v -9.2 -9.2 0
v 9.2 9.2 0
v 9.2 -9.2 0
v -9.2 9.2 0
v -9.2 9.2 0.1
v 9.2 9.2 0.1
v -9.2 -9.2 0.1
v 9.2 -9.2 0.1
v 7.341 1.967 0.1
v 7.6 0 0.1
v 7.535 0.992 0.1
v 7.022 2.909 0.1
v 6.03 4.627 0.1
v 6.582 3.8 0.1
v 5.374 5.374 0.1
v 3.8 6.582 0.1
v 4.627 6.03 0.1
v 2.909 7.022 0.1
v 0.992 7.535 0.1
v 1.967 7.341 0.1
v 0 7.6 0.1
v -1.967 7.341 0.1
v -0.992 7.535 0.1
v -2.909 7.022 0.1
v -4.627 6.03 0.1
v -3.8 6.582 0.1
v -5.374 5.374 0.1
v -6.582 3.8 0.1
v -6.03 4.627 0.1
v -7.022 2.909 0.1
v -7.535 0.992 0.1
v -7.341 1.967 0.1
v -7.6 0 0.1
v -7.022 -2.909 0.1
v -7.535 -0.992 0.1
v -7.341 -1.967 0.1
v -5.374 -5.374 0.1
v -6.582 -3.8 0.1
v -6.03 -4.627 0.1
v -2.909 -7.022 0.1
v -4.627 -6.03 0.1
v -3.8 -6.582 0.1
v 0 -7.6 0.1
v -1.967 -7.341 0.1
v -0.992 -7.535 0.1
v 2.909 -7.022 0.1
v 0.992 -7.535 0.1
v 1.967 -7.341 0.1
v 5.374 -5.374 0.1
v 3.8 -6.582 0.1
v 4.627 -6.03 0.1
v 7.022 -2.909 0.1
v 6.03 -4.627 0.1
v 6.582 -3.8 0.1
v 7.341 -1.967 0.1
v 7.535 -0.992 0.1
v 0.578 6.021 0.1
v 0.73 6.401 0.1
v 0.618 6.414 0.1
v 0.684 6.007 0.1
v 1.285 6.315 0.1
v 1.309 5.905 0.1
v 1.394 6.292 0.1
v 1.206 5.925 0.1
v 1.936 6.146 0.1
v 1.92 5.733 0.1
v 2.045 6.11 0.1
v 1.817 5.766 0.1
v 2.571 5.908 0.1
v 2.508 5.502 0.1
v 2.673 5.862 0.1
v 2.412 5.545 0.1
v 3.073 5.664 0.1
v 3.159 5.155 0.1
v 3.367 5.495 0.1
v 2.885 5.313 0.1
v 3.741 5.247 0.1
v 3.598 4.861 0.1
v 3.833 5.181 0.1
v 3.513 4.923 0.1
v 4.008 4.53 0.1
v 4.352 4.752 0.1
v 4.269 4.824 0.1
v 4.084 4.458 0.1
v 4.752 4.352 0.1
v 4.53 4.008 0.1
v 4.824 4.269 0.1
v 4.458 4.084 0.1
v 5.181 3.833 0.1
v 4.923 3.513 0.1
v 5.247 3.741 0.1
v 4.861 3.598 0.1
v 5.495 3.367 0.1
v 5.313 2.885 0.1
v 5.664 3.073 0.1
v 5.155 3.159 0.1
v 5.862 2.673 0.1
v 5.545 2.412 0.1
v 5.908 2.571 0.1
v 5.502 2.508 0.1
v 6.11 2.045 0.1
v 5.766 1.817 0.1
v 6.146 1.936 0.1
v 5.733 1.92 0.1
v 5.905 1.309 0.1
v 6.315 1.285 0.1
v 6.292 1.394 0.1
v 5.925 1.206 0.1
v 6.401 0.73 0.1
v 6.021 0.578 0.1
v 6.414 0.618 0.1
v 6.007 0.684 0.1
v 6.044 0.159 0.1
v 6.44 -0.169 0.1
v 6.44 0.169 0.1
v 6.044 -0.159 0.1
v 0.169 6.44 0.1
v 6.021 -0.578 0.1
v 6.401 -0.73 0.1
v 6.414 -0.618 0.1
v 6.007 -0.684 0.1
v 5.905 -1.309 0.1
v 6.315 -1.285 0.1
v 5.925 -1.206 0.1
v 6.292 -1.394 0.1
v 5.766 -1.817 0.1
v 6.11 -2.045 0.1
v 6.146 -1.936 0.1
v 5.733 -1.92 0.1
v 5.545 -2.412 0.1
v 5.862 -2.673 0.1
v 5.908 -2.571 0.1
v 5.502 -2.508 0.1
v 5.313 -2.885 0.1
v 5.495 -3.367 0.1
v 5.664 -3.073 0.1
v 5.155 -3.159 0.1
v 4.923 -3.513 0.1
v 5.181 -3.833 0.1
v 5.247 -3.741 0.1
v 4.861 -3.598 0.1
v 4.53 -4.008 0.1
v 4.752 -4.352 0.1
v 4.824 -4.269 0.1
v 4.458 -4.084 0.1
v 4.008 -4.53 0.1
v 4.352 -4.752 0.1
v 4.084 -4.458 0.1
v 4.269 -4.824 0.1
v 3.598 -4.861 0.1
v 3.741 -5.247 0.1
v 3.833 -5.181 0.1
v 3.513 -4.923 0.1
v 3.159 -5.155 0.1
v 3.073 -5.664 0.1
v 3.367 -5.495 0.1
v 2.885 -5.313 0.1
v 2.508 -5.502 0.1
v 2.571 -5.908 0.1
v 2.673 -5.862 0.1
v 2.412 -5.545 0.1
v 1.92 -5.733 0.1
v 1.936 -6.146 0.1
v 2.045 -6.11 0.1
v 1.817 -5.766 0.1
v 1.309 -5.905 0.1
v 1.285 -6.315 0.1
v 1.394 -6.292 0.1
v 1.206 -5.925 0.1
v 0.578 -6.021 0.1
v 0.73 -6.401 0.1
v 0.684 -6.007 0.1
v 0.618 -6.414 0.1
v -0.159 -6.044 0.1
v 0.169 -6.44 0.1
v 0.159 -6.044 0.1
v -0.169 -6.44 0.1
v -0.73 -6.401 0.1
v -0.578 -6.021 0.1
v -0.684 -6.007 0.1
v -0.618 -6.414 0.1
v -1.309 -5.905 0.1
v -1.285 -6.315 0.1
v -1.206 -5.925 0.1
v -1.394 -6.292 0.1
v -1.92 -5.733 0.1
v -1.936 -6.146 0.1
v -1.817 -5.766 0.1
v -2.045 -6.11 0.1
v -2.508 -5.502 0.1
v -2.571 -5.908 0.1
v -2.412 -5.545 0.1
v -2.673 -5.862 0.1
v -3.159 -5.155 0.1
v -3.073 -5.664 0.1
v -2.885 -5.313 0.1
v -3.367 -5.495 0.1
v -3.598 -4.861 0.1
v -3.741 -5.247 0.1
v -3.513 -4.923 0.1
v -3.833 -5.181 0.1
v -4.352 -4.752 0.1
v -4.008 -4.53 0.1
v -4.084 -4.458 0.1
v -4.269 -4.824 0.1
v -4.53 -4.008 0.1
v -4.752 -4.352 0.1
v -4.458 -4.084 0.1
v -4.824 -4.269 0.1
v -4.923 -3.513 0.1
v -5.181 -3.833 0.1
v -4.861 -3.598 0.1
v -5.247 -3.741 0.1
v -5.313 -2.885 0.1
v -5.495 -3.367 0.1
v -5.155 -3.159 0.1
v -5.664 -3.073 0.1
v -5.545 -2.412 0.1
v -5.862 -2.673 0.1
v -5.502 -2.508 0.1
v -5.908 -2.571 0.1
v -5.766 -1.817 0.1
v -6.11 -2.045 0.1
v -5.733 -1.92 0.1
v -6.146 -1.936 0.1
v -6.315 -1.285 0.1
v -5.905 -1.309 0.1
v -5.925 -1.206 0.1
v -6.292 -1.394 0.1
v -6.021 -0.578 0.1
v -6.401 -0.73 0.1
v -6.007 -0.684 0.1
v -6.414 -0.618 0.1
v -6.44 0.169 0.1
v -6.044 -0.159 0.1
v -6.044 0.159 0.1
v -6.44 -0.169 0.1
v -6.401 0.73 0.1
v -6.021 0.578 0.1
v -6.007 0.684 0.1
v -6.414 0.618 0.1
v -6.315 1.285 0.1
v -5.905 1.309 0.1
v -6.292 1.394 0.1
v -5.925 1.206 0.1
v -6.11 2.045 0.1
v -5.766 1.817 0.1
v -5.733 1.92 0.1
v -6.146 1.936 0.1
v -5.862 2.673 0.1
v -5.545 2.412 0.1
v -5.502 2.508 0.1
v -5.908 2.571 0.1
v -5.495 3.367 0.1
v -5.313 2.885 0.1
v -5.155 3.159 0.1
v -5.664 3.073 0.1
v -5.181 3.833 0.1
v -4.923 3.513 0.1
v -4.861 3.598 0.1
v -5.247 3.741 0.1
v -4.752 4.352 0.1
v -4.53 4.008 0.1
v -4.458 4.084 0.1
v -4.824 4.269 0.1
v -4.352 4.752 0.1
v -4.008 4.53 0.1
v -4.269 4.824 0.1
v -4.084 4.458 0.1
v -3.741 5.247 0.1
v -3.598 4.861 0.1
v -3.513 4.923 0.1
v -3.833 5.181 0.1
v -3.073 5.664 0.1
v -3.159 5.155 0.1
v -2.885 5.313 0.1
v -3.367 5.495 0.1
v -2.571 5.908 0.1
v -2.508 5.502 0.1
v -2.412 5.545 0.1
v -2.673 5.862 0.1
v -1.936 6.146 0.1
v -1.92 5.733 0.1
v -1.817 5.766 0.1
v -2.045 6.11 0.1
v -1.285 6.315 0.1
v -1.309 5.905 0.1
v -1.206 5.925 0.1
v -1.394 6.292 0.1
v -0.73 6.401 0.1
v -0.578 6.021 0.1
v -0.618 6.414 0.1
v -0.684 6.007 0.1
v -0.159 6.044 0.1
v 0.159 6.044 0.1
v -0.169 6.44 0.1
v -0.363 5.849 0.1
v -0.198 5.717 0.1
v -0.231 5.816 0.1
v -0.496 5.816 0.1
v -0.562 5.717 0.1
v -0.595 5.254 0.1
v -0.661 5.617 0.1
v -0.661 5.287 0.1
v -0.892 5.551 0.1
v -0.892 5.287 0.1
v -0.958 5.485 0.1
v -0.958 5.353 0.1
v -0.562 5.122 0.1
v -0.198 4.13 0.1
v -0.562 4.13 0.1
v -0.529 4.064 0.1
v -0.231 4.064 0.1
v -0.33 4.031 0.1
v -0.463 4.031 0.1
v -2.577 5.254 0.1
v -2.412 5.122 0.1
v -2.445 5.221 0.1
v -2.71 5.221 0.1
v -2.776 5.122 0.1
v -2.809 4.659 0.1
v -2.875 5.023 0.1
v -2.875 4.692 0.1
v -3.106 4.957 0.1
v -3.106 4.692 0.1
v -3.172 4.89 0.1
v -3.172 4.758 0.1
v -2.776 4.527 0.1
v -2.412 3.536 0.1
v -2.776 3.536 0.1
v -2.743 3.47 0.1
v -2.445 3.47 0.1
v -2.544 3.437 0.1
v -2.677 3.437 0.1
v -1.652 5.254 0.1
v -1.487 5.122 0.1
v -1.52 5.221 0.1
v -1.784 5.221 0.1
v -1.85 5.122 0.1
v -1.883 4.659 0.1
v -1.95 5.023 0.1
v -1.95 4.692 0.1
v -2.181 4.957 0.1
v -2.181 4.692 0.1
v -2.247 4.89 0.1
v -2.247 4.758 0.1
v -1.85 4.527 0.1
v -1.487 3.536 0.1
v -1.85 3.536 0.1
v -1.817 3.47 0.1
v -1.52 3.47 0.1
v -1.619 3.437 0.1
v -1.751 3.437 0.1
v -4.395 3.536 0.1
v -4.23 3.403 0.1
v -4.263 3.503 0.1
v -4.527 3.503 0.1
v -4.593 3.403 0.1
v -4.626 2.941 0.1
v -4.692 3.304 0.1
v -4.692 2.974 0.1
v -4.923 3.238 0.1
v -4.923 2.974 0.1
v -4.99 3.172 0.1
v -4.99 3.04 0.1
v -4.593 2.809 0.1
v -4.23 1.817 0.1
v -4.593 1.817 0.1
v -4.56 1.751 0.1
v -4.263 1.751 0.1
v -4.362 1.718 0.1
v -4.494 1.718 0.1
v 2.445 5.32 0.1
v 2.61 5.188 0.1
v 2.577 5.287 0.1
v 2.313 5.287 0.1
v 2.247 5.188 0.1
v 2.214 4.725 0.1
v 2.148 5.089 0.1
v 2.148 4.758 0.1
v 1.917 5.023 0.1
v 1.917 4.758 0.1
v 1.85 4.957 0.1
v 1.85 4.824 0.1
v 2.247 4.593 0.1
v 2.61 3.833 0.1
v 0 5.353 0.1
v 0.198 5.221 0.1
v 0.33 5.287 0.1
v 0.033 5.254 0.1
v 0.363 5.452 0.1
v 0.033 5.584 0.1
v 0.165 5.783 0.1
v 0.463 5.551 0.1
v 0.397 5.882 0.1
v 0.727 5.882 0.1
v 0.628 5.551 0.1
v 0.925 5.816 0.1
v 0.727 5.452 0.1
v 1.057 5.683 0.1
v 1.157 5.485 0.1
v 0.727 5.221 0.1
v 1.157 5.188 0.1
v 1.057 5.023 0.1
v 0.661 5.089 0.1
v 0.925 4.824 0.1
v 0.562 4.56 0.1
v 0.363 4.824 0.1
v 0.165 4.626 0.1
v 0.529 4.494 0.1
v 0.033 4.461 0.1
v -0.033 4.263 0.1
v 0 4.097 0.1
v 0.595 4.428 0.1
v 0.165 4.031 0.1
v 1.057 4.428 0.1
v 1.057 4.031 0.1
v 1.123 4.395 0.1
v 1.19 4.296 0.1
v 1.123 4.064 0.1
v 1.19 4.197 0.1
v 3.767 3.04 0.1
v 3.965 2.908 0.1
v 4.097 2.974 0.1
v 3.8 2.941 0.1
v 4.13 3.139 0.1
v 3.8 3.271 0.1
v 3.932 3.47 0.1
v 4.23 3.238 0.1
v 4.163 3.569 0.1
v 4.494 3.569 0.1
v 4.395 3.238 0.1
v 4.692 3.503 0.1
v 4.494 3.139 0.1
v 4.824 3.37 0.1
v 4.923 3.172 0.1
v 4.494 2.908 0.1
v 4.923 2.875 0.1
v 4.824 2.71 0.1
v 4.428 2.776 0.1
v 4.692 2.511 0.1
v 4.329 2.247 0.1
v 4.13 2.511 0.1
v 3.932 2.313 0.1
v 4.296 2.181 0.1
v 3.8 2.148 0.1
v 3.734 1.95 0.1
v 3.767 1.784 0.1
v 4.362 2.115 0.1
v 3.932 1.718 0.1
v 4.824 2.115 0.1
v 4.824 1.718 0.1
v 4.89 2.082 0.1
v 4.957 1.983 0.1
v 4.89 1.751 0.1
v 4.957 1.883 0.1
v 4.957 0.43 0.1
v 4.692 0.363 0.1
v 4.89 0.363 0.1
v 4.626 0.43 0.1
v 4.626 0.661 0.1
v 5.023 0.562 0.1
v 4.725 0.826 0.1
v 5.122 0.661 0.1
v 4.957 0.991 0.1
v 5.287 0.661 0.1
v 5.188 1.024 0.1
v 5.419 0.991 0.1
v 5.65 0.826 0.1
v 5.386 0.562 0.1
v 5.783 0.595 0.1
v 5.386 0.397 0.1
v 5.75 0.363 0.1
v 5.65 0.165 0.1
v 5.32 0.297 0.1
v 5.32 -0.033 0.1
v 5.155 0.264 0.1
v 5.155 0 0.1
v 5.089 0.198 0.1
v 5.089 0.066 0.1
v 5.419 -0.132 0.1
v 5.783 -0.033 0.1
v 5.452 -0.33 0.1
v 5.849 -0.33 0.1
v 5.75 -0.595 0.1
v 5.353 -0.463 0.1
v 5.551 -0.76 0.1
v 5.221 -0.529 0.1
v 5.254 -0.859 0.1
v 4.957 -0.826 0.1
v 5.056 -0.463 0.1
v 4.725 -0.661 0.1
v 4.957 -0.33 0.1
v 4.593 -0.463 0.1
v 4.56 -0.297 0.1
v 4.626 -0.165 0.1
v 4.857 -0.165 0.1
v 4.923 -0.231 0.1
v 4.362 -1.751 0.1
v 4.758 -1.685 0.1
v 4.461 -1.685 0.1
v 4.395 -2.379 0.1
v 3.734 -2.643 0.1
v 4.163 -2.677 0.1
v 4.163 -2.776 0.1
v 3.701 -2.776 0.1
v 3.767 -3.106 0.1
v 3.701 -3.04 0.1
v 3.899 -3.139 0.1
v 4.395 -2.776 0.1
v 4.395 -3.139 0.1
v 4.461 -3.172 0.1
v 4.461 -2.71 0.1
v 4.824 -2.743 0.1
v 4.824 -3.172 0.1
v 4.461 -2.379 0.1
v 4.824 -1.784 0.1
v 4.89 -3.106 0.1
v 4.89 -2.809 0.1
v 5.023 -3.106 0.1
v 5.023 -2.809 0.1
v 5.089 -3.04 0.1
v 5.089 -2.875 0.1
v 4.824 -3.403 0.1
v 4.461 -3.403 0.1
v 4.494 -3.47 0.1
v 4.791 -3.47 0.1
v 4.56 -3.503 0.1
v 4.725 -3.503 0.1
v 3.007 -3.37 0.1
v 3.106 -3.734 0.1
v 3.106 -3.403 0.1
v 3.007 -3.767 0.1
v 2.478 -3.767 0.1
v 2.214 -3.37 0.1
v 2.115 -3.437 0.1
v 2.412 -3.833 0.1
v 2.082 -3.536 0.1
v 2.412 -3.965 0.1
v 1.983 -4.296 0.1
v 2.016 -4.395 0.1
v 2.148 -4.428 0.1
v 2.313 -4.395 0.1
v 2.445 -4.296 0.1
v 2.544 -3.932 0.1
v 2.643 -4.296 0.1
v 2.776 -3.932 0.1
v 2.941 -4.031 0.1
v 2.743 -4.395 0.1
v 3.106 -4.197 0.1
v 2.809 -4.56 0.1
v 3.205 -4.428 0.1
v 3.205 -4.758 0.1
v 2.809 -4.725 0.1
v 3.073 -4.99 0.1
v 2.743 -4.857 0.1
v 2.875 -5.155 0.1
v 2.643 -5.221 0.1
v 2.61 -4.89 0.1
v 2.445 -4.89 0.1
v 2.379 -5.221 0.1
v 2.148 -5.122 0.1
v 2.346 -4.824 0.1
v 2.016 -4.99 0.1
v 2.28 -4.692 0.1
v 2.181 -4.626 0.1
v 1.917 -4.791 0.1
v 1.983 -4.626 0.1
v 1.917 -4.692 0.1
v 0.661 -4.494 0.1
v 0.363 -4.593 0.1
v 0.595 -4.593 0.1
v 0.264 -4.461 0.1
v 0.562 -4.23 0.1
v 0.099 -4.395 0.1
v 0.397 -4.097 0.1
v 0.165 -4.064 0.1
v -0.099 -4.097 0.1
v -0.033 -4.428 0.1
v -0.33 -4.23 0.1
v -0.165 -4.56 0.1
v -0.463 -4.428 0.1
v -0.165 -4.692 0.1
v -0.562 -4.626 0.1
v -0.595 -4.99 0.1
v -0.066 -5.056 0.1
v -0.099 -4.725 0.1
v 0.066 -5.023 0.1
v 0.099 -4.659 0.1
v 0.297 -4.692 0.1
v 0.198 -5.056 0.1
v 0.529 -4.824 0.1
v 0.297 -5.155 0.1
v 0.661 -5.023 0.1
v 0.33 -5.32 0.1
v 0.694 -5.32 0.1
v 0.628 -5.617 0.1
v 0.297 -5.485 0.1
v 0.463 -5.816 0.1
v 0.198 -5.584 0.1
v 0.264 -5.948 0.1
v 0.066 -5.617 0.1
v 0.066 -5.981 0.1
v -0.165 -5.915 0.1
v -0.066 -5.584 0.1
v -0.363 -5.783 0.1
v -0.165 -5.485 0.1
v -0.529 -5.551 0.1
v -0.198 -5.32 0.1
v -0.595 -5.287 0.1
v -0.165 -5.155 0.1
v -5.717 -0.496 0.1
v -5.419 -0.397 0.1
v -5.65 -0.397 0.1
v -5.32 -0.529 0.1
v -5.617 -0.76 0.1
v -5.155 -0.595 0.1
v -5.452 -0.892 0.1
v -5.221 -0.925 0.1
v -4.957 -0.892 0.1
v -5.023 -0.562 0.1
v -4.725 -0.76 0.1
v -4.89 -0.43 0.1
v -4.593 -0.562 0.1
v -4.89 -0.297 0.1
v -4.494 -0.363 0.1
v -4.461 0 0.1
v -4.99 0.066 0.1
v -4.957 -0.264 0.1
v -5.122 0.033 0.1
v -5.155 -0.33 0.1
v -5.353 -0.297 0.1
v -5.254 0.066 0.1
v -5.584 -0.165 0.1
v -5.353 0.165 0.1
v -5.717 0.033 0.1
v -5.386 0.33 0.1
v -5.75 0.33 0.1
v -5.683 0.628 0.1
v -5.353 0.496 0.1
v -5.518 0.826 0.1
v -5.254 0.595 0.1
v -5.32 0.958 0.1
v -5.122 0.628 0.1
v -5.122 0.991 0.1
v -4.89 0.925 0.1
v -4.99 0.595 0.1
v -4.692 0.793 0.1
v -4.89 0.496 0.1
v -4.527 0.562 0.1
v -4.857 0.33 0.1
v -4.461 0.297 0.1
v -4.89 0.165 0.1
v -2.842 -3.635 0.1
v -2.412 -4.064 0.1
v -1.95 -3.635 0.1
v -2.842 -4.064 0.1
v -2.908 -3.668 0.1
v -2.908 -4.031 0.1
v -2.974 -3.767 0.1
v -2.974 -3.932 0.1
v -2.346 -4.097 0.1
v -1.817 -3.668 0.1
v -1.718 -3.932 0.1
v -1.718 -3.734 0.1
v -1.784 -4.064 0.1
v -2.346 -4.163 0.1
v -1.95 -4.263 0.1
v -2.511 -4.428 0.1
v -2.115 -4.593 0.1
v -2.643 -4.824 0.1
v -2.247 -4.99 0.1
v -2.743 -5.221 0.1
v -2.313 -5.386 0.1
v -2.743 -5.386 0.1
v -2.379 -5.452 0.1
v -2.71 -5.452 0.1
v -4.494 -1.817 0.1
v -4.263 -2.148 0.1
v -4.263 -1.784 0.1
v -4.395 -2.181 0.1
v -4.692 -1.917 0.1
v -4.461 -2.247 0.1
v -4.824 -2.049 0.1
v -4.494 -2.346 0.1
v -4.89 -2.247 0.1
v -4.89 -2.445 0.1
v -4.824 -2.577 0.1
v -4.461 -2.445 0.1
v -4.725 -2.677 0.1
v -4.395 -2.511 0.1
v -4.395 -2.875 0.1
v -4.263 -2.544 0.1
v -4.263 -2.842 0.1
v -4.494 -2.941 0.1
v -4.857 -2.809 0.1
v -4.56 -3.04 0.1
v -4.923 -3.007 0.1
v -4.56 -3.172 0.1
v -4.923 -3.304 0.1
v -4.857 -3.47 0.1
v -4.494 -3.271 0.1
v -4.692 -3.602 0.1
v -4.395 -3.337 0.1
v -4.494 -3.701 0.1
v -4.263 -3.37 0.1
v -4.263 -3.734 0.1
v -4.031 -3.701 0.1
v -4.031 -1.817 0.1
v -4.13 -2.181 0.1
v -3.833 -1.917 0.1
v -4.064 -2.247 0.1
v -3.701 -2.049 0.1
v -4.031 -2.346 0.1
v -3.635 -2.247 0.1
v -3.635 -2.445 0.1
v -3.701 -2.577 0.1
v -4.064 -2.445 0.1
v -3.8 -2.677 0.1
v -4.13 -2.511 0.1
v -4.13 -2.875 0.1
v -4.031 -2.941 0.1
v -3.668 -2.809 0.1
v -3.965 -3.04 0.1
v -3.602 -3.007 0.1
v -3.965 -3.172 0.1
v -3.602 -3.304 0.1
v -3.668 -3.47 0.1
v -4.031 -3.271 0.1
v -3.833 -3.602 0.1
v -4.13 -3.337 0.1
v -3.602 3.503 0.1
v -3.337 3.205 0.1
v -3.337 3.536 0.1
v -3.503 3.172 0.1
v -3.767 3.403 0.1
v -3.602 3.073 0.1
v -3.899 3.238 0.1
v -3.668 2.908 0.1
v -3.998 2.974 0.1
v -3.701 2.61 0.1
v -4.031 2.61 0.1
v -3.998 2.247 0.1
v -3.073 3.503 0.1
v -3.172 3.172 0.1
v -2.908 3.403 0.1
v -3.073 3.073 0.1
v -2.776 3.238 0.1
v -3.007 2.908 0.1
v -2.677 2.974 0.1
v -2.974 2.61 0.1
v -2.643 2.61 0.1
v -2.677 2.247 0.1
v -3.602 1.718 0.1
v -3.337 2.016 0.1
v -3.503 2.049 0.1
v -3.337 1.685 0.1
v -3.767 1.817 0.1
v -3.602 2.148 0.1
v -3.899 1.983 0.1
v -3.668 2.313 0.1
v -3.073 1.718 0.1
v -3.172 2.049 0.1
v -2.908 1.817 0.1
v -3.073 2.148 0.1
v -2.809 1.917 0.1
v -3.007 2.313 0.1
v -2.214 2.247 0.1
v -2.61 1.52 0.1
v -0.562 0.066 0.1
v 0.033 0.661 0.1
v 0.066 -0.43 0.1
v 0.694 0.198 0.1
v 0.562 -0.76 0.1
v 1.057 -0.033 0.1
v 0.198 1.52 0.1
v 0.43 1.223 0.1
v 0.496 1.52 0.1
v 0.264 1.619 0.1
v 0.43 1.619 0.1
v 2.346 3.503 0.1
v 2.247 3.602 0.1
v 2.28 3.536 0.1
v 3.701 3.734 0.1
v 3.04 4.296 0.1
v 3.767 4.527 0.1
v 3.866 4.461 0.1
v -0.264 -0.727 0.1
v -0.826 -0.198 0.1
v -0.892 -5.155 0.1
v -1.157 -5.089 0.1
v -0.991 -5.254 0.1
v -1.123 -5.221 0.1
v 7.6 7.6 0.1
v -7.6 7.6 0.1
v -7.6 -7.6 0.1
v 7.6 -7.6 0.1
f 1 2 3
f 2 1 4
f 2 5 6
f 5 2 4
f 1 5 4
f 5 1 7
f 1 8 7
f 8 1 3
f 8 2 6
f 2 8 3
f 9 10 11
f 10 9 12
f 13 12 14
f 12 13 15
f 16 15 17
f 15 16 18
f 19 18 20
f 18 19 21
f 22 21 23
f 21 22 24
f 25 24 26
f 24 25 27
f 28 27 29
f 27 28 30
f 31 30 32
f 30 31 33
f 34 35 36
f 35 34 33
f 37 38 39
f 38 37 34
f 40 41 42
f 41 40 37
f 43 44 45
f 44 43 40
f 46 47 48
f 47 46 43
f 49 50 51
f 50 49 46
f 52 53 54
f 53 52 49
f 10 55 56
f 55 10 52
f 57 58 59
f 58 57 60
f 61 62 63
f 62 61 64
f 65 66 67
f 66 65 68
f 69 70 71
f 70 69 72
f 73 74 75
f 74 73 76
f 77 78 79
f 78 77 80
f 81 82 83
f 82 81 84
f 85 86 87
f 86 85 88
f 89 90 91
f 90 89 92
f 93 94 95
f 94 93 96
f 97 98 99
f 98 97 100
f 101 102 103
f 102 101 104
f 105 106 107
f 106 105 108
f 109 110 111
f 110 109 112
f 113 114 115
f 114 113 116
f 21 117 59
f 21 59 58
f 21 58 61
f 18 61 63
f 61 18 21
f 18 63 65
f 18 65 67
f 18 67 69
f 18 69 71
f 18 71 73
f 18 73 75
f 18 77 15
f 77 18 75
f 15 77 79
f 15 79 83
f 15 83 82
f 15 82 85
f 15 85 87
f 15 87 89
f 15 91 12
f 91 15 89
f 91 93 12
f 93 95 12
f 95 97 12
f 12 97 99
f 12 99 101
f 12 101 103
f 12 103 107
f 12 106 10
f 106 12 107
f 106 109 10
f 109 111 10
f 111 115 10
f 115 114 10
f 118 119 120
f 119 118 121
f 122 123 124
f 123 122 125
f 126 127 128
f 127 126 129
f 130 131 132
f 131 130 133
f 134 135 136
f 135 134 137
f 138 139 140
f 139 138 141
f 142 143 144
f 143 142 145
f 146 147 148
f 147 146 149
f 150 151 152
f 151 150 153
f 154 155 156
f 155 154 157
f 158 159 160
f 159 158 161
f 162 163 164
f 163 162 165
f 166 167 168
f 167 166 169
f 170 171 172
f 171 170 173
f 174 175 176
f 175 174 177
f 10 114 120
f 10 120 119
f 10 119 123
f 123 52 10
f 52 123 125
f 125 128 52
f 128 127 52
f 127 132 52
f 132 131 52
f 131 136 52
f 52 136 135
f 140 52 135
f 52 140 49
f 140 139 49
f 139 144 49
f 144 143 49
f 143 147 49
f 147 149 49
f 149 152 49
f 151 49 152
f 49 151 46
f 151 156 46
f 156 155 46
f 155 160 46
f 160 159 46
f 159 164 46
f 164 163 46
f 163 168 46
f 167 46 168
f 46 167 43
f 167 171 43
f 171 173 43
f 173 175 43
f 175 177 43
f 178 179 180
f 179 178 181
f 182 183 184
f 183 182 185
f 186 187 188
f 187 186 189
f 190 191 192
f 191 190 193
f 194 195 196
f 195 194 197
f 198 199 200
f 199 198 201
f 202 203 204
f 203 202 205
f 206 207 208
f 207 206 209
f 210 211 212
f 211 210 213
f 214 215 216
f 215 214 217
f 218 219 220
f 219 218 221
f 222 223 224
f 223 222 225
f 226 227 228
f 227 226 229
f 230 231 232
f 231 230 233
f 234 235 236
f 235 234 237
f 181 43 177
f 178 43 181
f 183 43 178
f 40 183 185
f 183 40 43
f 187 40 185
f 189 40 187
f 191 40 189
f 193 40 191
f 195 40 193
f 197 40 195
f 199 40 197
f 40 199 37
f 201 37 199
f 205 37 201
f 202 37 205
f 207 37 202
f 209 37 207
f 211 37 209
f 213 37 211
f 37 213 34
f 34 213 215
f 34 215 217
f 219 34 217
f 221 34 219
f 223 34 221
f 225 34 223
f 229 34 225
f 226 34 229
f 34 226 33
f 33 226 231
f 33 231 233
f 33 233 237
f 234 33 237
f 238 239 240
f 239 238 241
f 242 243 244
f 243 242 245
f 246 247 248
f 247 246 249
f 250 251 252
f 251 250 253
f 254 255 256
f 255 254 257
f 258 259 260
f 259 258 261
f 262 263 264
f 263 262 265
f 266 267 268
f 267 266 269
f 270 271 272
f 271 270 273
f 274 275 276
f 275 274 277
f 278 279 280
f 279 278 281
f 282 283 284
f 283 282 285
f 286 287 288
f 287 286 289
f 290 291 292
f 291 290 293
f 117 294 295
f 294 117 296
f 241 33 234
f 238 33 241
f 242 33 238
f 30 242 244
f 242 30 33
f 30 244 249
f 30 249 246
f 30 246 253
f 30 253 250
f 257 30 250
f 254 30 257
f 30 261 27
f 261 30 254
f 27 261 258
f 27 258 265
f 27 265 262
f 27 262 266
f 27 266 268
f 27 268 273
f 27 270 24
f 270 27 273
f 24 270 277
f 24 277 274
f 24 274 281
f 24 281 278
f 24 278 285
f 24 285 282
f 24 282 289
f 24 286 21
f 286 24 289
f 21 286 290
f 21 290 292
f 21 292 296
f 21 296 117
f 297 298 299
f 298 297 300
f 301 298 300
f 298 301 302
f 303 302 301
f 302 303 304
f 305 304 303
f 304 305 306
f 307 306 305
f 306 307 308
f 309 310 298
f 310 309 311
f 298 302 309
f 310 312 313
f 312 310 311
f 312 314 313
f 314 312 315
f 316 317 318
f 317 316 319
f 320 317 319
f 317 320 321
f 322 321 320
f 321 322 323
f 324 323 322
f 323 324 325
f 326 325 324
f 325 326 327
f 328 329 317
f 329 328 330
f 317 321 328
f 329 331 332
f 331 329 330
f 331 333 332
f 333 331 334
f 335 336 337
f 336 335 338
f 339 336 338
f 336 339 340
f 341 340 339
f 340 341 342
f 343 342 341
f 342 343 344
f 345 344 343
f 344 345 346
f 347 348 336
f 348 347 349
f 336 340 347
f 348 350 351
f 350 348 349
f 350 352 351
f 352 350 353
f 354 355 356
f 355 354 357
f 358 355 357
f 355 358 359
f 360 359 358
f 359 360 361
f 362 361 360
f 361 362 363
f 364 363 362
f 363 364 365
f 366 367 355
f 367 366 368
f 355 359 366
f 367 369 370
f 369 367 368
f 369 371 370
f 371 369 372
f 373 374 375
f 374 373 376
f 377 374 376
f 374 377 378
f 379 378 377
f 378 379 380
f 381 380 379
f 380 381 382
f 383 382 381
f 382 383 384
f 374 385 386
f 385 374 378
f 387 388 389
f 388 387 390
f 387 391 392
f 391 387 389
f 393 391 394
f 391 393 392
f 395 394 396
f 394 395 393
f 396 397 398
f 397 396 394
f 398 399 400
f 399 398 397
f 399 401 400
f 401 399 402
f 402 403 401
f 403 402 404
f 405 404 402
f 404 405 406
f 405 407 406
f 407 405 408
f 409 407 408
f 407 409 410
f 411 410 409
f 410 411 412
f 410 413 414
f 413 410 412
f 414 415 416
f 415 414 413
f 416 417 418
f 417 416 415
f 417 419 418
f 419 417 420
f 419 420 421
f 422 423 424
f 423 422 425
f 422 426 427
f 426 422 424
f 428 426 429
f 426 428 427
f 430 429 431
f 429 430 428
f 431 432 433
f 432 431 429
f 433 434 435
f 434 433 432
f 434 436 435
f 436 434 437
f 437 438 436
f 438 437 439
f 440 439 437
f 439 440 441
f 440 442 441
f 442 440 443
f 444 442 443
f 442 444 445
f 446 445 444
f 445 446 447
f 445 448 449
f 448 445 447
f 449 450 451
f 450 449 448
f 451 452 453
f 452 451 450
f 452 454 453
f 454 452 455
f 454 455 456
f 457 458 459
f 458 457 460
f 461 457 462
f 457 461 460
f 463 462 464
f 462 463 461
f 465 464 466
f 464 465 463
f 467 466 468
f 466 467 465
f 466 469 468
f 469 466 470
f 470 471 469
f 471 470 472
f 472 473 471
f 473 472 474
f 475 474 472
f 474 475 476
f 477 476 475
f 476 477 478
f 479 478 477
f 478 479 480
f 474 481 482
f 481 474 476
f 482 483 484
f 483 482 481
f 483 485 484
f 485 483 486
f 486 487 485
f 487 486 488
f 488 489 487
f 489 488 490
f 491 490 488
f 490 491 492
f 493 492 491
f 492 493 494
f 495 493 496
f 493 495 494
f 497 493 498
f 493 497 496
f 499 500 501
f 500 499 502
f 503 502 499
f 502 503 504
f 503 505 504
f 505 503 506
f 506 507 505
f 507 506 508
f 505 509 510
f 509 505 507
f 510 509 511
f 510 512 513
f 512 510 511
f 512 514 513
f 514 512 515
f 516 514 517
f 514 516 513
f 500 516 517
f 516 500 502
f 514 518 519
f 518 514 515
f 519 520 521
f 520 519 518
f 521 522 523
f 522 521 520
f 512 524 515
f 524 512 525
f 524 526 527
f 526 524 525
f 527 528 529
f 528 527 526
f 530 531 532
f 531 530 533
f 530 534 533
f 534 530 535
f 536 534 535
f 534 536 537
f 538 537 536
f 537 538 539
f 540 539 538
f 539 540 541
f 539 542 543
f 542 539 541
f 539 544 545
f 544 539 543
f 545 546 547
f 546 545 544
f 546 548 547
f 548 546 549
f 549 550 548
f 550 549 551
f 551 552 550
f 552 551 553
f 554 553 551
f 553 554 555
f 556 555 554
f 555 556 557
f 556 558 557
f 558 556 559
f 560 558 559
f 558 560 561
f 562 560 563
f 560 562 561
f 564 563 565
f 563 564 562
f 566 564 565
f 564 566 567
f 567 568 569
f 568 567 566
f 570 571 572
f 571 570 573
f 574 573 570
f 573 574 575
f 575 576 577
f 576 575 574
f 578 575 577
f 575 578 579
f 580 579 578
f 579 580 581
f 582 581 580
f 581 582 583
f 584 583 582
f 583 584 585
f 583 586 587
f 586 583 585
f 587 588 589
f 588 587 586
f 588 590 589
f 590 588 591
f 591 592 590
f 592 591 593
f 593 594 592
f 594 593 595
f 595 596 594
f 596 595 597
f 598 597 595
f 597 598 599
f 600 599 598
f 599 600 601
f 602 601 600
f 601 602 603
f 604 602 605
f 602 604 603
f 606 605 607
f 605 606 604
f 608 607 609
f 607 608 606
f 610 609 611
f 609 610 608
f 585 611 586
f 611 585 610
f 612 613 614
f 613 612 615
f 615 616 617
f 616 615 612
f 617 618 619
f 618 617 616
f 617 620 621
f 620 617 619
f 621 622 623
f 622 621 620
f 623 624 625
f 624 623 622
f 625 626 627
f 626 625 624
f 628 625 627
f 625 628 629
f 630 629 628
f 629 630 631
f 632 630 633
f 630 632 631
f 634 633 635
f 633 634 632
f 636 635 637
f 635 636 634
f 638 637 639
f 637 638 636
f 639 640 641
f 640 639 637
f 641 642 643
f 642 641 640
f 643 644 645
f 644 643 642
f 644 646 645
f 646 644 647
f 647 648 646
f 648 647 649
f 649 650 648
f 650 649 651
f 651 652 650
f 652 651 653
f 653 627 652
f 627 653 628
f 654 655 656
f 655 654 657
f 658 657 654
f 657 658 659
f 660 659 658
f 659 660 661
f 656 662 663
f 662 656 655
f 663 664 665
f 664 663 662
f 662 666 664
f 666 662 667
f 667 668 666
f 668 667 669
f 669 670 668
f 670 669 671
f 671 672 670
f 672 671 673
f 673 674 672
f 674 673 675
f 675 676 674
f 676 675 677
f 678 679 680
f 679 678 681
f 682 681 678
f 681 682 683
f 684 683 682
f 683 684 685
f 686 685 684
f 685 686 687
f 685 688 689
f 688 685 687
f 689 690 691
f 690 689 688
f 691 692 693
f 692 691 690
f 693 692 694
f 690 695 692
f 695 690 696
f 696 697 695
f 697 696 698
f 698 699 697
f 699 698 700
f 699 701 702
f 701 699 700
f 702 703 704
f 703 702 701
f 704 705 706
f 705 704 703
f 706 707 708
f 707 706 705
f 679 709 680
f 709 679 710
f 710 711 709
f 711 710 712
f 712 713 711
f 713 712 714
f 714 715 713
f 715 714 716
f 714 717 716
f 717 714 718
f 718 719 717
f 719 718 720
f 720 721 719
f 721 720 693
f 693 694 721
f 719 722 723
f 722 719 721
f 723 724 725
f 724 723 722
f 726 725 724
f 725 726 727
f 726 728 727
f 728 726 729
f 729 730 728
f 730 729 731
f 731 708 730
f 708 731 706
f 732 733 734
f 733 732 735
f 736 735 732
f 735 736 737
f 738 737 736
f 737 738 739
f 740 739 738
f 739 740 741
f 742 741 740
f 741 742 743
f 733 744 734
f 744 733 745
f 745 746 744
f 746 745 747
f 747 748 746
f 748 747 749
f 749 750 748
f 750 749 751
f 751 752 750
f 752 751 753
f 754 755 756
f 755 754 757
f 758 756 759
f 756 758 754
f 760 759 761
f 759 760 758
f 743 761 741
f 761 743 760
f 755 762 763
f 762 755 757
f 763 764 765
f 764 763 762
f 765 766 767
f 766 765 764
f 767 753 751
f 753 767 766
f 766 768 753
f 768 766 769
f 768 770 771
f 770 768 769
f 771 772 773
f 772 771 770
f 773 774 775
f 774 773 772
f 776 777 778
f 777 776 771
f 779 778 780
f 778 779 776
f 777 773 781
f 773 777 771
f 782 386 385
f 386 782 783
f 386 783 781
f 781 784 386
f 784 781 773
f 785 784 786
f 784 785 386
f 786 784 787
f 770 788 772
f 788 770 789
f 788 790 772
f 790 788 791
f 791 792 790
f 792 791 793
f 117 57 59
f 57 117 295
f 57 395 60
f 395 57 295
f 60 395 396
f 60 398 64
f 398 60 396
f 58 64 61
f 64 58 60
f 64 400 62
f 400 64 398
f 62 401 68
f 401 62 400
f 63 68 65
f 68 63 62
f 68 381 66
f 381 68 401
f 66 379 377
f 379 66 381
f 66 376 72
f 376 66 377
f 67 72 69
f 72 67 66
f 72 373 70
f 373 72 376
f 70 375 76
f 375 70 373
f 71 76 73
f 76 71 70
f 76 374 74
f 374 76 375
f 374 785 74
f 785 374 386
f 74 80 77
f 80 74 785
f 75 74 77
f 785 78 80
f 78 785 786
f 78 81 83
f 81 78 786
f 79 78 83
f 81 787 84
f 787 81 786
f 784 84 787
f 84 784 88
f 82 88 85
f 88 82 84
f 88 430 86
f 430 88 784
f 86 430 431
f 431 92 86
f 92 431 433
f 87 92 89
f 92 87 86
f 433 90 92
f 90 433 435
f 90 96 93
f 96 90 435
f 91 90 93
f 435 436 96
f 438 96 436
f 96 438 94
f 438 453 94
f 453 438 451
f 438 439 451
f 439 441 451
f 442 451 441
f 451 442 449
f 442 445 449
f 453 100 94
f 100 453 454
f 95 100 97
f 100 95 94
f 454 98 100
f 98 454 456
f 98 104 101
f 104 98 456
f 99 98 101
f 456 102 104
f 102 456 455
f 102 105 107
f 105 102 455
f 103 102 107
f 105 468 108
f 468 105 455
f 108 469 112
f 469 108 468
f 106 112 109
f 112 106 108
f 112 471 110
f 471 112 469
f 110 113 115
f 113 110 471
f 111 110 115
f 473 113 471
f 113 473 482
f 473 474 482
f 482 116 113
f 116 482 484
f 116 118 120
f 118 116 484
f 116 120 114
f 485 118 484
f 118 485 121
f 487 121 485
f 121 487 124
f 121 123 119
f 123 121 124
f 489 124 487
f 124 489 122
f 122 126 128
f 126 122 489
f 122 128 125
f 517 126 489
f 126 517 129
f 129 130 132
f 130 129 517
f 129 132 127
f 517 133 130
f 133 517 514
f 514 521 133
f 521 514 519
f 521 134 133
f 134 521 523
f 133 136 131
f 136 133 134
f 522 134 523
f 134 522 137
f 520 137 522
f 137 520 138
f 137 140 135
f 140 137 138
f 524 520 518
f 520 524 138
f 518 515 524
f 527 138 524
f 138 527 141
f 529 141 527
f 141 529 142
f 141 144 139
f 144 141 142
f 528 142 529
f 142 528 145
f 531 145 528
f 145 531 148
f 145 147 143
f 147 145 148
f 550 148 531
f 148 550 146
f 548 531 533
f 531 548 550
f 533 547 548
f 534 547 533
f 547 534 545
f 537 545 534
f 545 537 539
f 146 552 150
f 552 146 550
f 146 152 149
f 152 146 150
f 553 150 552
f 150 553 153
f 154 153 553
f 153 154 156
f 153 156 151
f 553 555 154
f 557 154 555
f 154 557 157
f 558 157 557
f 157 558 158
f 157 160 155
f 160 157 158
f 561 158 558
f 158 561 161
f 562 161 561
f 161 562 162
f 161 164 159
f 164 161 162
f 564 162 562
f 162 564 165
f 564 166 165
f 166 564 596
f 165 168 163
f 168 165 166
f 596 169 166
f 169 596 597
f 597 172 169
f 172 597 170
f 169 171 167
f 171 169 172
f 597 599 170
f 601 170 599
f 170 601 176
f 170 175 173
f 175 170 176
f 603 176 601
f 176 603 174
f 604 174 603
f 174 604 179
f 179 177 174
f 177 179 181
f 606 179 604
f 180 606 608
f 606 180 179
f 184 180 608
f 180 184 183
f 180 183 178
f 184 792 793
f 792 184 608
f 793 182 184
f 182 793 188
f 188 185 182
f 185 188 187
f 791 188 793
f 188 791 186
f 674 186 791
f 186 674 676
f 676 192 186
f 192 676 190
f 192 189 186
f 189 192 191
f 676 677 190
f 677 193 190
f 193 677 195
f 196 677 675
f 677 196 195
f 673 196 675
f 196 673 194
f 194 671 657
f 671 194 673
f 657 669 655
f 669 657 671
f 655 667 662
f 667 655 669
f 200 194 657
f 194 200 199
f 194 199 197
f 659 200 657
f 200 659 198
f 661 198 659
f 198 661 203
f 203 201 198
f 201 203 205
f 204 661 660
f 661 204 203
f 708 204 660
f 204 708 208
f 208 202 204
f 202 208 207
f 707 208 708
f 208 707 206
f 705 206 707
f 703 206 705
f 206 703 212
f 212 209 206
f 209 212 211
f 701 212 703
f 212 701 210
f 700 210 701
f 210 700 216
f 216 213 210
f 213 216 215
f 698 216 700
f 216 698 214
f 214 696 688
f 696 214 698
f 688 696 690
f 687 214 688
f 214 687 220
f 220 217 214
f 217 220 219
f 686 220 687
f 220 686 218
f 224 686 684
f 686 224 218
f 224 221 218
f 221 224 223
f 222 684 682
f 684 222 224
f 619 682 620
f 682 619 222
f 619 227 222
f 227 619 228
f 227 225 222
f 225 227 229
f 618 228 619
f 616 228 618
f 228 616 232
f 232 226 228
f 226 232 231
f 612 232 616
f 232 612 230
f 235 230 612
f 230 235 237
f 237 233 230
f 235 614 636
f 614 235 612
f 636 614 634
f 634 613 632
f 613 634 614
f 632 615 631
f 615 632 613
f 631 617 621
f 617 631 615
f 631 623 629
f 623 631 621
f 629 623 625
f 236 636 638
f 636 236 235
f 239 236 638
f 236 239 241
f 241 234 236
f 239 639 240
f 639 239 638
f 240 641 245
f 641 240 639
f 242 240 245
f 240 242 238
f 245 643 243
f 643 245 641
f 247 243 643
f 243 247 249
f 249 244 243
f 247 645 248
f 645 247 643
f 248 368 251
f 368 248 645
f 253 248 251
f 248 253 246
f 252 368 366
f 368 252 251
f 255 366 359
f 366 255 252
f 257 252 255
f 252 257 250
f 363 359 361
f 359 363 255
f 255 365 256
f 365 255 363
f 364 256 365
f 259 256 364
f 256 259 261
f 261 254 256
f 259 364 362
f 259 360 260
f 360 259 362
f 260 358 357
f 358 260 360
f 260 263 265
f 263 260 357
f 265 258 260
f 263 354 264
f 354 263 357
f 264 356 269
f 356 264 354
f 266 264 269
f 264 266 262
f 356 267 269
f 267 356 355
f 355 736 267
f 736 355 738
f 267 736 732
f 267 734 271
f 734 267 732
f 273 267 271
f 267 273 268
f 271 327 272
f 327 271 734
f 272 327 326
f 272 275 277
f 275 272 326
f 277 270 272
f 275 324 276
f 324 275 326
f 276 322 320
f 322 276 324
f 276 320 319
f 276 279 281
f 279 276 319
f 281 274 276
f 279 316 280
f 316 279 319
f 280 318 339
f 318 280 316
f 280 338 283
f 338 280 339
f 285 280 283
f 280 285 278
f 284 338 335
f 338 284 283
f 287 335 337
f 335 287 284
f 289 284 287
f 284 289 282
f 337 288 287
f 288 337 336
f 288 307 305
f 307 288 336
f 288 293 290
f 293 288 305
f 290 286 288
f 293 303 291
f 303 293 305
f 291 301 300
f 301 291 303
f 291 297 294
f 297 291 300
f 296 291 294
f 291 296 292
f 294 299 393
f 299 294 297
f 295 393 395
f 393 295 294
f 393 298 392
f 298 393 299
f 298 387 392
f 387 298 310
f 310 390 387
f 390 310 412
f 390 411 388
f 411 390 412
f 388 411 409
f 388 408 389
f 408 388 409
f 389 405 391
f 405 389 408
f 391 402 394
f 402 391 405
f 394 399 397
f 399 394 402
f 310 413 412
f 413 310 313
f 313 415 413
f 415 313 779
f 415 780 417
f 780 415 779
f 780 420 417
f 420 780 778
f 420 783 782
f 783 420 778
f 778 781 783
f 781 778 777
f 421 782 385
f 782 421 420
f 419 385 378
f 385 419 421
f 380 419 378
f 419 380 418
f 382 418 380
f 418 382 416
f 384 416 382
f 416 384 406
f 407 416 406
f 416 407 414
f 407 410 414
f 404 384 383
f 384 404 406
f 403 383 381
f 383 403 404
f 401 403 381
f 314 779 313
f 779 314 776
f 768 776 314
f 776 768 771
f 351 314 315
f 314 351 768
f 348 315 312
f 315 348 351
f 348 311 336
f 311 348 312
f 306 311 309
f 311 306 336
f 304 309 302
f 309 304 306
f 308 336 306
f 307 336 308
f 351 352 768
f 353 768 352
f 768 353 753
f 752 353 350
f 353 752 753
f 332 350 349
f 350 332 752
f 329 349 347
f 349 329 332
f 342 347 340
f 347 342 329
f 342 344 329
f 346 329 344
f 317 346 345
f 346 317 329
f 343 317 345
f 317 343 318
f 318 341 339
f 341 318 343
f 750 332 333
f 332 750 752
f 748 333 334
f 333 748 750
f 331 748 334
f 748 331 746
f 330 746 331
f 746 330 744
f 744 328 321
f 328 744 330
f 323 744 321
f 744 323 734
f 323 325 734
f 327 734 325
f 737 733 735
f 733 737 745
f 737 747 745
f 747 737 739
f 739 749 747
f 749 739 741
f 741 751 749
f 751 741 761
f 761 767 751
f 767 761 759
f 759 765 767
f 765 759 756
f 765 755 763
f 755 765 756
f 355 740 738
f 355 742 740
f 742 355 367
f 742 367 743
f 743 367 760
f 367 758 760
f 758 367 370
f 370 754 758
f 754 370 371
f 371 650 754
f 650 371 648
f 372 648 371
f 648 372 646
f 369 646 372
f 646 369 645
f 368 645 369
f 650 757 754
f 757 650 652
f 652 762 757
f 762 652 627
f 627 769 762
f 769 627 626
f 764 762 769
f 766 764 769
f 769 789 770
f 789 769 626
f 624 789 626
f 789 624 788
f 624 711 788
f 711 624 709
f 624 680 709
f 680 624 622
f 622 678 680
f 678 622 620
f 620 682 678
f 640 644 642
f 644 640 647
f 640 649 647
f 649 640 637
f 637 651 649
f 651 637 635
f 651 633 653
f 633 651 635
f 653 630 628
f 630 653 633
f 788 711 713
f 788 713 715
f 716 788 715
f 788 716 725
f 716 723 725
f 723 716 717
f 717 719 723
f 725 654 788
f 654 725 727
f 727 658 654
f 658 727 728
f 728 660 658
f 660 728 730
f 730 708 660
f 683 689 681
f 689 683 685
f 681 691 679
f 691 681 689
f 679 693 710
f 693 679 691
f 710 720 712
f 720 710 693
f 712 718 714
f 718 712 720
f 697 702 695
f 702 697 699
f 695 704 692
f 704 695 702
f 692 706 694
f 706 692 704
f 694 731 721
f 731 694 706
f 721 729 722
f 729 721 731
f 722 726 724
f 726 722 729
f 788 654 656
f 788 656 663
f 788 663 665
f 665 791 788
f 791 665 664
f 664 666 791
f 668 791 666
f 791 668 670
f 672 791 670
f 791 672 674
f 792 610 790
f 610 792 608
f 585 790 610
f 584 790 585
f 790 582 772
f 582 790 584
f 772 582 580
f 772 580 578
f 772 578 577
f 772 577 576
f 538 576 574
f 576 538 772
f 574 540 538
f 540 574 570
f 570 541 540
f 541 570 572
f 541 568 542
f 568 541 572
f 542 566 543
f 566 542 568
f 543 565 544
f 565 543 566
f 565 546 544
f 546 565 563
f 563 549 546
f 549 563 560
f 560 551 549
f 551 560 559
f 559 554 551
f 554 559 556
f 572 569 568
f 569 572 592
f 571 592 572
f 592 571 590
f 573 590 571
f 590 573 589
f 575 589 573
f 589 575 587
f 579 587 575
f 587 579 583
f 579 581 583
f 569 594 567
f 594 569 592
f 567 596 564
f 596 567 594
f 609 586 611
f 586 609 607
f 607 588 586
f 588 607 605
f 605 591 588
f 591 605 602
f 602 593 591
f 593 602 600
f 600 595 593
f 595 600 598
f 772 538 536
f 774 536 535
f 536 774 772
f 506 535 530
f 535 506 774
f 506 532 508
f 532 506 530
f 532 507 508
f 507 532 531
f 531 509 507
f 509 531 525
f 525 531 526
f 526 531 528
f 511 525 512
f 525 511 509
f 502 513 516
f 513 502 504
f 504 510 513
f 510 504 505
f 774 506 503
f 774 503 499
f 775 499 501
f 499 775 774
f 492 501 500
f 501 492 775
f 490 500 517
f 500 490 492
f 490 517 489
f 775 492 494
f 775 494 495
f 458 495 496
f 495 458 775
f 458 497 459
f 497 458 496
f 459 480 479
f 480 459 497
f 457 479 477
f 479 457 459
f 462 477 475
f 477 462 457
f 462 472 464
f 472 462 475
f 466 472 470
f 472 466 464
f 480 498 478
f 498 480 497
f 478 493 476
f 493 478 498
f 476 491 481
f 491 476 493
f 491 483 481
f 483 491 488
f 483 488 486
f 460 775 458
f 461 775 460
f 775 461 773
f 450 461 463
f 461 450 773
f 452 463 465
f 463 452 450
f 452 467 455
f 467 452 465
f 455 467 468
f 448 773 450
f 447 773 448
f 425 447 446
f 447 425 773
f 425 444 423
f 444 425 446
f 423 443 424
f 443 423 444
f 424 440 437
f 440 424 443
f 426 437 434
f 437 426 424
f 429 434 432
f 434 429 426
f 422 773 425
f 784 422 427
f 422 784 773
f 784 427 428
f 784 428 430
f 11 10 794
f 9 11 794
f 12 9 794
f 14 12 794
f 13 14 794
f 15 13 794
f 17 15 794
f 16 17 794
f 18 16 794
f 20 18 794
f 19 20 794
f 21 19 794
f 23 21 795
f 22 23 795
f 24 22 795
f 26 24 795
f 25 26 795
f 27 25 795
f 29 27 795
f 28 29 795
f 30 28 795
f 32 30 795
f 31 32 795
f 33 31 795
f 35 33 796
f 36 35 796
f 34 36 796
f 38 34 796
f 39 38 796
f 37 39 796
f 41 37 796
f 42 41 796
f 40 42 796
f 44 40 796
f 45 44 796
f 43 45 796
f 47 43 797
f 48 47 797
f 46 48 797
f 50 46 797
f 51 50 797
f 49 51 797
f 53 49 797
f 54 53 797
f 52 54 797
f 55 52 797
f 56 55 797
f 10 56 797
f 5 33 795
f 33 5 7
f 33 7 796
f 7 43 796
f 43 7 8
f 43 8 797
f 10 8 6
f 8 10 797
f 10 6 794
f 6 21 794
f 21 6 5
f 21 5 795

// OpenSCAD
use <../lib.scad>
use <../p/48/4-4ndis.scad>
use <../p/box5-12.scad>
use <s/004659cs01.scad>
function ldraw_lib__004589a() = [
// 0 Sticker  2.3 x  2.3 with Clock Hands 10:06:32 on Red Background
// 0 Name: 004589a.dat
// 0 Author: Alex Taylor [anathema]
// 0 !LDRAW_ORG Part UPDATE 2022-06
// 0 !LICENSE Licensed under CC BY 2.0 and CC BY 4.0 : see CAreadme.txt
// 
// 0 BFC CERTIFY CCW
  [0,"BFC","CERTIFY"],
  [0,"BFC","CCW"],
// 
// 0 !KEYWORDS Set 148, Station, Train
// 
// 0 !HISTORY 2019-08-04 [anathema] Original pattern using TEXMAP
// 0 !HISTORY 2021-03-10 [RainbowDolphin] Vectorized the pattern and fixed T-junctions
// 0 !HISTORY 2022-12-20 [PTadmin] Official Update 2022-06
// 
// 
// 1 16 0 -0.25 0 23 0 0 0 0.25 0 0 0 23 box5-12.dat
  [1,16,0,-0.25,0,23,0,0,0,0.25,0,0,0,23, ldraw_lib__box5_12()],
// 1 16 0 0 0 .82609 0 0 0 1 0 0 0 .82609 s\004659cs01.dat
  [1,16,0,0,0,.82609,0,0,0,1,0,0,0,.82609, ldraw_lib__s__004659cs01()],
// 1 4 0 -0.25 0 19 0 0 0 1 0 0 0 19 48\4-4ndis.dat
  [1,4,0,-0.25,0,19,0,0,0,1,0,0,0,19, ldraw_lib__48__4_4ndis()],
// 4 4 -19 -.25 19 -23 -.25 23 -23 -.25 -23 -19 -.25 0
  [4,4,-19,-.25,19,-23,-.25,23,-23,-.25,-23,-19,-.25,0],
// 3 4 -19 -.25 0 -23 -.25 -23 -19 -.25 -19
  [3,4,-19,-.25,0,-23,-.25,-23,-19,-.25,-19],
// 4 4 23 -.25 -23 0 -.25 -19 -19 -.25 -19 -23 -.25 -23
  [4,4,23,-.25,-23,0,-.25,-19,-19,-.25,-19,-23,-.25,-23],
// 3 4 0 -.25 -19 23 -.25 -23 19 -.25 -19
  [3,4,0,-.25,-19,23,-.25,-23,19,-.25,-19],
// 4 4 23 -.25 23 19 -.25 0 19 -.25 -19 23 -.25 -23
  [4,4,23,-.25,23,19,-.25,0,19,-.25,-19,23,-.25,-23],
// 3 4 19 -.25 0 23 -.25 23 19 -.25 19
  [3,4,19,-.25,0,23,-.25,23,19,-.25,19],
// 4 4 19 -.25 19 23 -.25 23 -23 -.25 23 0 -.25 19
  [4,4,19,-.25,19,23,-.25,23,-23,-.25,23,0,-.25,19],
// 3 4 0 -.25 19 -23 -.25 23 -19 -.25 19
  [3,4,0,-.25,19,-23,-.25,23,-19,-.25,19],
];
module ldraw_lib__004589a(step=0, col=false, unit=2/5, alt=false, line=0.2, solid=!$preview)
    makepoly(ldraw_lib__004589a(), step=step, col=col, unit=unit, alt=alt, line=line, solid=solid);
ldraw_lib__004589a(line=0.2);
